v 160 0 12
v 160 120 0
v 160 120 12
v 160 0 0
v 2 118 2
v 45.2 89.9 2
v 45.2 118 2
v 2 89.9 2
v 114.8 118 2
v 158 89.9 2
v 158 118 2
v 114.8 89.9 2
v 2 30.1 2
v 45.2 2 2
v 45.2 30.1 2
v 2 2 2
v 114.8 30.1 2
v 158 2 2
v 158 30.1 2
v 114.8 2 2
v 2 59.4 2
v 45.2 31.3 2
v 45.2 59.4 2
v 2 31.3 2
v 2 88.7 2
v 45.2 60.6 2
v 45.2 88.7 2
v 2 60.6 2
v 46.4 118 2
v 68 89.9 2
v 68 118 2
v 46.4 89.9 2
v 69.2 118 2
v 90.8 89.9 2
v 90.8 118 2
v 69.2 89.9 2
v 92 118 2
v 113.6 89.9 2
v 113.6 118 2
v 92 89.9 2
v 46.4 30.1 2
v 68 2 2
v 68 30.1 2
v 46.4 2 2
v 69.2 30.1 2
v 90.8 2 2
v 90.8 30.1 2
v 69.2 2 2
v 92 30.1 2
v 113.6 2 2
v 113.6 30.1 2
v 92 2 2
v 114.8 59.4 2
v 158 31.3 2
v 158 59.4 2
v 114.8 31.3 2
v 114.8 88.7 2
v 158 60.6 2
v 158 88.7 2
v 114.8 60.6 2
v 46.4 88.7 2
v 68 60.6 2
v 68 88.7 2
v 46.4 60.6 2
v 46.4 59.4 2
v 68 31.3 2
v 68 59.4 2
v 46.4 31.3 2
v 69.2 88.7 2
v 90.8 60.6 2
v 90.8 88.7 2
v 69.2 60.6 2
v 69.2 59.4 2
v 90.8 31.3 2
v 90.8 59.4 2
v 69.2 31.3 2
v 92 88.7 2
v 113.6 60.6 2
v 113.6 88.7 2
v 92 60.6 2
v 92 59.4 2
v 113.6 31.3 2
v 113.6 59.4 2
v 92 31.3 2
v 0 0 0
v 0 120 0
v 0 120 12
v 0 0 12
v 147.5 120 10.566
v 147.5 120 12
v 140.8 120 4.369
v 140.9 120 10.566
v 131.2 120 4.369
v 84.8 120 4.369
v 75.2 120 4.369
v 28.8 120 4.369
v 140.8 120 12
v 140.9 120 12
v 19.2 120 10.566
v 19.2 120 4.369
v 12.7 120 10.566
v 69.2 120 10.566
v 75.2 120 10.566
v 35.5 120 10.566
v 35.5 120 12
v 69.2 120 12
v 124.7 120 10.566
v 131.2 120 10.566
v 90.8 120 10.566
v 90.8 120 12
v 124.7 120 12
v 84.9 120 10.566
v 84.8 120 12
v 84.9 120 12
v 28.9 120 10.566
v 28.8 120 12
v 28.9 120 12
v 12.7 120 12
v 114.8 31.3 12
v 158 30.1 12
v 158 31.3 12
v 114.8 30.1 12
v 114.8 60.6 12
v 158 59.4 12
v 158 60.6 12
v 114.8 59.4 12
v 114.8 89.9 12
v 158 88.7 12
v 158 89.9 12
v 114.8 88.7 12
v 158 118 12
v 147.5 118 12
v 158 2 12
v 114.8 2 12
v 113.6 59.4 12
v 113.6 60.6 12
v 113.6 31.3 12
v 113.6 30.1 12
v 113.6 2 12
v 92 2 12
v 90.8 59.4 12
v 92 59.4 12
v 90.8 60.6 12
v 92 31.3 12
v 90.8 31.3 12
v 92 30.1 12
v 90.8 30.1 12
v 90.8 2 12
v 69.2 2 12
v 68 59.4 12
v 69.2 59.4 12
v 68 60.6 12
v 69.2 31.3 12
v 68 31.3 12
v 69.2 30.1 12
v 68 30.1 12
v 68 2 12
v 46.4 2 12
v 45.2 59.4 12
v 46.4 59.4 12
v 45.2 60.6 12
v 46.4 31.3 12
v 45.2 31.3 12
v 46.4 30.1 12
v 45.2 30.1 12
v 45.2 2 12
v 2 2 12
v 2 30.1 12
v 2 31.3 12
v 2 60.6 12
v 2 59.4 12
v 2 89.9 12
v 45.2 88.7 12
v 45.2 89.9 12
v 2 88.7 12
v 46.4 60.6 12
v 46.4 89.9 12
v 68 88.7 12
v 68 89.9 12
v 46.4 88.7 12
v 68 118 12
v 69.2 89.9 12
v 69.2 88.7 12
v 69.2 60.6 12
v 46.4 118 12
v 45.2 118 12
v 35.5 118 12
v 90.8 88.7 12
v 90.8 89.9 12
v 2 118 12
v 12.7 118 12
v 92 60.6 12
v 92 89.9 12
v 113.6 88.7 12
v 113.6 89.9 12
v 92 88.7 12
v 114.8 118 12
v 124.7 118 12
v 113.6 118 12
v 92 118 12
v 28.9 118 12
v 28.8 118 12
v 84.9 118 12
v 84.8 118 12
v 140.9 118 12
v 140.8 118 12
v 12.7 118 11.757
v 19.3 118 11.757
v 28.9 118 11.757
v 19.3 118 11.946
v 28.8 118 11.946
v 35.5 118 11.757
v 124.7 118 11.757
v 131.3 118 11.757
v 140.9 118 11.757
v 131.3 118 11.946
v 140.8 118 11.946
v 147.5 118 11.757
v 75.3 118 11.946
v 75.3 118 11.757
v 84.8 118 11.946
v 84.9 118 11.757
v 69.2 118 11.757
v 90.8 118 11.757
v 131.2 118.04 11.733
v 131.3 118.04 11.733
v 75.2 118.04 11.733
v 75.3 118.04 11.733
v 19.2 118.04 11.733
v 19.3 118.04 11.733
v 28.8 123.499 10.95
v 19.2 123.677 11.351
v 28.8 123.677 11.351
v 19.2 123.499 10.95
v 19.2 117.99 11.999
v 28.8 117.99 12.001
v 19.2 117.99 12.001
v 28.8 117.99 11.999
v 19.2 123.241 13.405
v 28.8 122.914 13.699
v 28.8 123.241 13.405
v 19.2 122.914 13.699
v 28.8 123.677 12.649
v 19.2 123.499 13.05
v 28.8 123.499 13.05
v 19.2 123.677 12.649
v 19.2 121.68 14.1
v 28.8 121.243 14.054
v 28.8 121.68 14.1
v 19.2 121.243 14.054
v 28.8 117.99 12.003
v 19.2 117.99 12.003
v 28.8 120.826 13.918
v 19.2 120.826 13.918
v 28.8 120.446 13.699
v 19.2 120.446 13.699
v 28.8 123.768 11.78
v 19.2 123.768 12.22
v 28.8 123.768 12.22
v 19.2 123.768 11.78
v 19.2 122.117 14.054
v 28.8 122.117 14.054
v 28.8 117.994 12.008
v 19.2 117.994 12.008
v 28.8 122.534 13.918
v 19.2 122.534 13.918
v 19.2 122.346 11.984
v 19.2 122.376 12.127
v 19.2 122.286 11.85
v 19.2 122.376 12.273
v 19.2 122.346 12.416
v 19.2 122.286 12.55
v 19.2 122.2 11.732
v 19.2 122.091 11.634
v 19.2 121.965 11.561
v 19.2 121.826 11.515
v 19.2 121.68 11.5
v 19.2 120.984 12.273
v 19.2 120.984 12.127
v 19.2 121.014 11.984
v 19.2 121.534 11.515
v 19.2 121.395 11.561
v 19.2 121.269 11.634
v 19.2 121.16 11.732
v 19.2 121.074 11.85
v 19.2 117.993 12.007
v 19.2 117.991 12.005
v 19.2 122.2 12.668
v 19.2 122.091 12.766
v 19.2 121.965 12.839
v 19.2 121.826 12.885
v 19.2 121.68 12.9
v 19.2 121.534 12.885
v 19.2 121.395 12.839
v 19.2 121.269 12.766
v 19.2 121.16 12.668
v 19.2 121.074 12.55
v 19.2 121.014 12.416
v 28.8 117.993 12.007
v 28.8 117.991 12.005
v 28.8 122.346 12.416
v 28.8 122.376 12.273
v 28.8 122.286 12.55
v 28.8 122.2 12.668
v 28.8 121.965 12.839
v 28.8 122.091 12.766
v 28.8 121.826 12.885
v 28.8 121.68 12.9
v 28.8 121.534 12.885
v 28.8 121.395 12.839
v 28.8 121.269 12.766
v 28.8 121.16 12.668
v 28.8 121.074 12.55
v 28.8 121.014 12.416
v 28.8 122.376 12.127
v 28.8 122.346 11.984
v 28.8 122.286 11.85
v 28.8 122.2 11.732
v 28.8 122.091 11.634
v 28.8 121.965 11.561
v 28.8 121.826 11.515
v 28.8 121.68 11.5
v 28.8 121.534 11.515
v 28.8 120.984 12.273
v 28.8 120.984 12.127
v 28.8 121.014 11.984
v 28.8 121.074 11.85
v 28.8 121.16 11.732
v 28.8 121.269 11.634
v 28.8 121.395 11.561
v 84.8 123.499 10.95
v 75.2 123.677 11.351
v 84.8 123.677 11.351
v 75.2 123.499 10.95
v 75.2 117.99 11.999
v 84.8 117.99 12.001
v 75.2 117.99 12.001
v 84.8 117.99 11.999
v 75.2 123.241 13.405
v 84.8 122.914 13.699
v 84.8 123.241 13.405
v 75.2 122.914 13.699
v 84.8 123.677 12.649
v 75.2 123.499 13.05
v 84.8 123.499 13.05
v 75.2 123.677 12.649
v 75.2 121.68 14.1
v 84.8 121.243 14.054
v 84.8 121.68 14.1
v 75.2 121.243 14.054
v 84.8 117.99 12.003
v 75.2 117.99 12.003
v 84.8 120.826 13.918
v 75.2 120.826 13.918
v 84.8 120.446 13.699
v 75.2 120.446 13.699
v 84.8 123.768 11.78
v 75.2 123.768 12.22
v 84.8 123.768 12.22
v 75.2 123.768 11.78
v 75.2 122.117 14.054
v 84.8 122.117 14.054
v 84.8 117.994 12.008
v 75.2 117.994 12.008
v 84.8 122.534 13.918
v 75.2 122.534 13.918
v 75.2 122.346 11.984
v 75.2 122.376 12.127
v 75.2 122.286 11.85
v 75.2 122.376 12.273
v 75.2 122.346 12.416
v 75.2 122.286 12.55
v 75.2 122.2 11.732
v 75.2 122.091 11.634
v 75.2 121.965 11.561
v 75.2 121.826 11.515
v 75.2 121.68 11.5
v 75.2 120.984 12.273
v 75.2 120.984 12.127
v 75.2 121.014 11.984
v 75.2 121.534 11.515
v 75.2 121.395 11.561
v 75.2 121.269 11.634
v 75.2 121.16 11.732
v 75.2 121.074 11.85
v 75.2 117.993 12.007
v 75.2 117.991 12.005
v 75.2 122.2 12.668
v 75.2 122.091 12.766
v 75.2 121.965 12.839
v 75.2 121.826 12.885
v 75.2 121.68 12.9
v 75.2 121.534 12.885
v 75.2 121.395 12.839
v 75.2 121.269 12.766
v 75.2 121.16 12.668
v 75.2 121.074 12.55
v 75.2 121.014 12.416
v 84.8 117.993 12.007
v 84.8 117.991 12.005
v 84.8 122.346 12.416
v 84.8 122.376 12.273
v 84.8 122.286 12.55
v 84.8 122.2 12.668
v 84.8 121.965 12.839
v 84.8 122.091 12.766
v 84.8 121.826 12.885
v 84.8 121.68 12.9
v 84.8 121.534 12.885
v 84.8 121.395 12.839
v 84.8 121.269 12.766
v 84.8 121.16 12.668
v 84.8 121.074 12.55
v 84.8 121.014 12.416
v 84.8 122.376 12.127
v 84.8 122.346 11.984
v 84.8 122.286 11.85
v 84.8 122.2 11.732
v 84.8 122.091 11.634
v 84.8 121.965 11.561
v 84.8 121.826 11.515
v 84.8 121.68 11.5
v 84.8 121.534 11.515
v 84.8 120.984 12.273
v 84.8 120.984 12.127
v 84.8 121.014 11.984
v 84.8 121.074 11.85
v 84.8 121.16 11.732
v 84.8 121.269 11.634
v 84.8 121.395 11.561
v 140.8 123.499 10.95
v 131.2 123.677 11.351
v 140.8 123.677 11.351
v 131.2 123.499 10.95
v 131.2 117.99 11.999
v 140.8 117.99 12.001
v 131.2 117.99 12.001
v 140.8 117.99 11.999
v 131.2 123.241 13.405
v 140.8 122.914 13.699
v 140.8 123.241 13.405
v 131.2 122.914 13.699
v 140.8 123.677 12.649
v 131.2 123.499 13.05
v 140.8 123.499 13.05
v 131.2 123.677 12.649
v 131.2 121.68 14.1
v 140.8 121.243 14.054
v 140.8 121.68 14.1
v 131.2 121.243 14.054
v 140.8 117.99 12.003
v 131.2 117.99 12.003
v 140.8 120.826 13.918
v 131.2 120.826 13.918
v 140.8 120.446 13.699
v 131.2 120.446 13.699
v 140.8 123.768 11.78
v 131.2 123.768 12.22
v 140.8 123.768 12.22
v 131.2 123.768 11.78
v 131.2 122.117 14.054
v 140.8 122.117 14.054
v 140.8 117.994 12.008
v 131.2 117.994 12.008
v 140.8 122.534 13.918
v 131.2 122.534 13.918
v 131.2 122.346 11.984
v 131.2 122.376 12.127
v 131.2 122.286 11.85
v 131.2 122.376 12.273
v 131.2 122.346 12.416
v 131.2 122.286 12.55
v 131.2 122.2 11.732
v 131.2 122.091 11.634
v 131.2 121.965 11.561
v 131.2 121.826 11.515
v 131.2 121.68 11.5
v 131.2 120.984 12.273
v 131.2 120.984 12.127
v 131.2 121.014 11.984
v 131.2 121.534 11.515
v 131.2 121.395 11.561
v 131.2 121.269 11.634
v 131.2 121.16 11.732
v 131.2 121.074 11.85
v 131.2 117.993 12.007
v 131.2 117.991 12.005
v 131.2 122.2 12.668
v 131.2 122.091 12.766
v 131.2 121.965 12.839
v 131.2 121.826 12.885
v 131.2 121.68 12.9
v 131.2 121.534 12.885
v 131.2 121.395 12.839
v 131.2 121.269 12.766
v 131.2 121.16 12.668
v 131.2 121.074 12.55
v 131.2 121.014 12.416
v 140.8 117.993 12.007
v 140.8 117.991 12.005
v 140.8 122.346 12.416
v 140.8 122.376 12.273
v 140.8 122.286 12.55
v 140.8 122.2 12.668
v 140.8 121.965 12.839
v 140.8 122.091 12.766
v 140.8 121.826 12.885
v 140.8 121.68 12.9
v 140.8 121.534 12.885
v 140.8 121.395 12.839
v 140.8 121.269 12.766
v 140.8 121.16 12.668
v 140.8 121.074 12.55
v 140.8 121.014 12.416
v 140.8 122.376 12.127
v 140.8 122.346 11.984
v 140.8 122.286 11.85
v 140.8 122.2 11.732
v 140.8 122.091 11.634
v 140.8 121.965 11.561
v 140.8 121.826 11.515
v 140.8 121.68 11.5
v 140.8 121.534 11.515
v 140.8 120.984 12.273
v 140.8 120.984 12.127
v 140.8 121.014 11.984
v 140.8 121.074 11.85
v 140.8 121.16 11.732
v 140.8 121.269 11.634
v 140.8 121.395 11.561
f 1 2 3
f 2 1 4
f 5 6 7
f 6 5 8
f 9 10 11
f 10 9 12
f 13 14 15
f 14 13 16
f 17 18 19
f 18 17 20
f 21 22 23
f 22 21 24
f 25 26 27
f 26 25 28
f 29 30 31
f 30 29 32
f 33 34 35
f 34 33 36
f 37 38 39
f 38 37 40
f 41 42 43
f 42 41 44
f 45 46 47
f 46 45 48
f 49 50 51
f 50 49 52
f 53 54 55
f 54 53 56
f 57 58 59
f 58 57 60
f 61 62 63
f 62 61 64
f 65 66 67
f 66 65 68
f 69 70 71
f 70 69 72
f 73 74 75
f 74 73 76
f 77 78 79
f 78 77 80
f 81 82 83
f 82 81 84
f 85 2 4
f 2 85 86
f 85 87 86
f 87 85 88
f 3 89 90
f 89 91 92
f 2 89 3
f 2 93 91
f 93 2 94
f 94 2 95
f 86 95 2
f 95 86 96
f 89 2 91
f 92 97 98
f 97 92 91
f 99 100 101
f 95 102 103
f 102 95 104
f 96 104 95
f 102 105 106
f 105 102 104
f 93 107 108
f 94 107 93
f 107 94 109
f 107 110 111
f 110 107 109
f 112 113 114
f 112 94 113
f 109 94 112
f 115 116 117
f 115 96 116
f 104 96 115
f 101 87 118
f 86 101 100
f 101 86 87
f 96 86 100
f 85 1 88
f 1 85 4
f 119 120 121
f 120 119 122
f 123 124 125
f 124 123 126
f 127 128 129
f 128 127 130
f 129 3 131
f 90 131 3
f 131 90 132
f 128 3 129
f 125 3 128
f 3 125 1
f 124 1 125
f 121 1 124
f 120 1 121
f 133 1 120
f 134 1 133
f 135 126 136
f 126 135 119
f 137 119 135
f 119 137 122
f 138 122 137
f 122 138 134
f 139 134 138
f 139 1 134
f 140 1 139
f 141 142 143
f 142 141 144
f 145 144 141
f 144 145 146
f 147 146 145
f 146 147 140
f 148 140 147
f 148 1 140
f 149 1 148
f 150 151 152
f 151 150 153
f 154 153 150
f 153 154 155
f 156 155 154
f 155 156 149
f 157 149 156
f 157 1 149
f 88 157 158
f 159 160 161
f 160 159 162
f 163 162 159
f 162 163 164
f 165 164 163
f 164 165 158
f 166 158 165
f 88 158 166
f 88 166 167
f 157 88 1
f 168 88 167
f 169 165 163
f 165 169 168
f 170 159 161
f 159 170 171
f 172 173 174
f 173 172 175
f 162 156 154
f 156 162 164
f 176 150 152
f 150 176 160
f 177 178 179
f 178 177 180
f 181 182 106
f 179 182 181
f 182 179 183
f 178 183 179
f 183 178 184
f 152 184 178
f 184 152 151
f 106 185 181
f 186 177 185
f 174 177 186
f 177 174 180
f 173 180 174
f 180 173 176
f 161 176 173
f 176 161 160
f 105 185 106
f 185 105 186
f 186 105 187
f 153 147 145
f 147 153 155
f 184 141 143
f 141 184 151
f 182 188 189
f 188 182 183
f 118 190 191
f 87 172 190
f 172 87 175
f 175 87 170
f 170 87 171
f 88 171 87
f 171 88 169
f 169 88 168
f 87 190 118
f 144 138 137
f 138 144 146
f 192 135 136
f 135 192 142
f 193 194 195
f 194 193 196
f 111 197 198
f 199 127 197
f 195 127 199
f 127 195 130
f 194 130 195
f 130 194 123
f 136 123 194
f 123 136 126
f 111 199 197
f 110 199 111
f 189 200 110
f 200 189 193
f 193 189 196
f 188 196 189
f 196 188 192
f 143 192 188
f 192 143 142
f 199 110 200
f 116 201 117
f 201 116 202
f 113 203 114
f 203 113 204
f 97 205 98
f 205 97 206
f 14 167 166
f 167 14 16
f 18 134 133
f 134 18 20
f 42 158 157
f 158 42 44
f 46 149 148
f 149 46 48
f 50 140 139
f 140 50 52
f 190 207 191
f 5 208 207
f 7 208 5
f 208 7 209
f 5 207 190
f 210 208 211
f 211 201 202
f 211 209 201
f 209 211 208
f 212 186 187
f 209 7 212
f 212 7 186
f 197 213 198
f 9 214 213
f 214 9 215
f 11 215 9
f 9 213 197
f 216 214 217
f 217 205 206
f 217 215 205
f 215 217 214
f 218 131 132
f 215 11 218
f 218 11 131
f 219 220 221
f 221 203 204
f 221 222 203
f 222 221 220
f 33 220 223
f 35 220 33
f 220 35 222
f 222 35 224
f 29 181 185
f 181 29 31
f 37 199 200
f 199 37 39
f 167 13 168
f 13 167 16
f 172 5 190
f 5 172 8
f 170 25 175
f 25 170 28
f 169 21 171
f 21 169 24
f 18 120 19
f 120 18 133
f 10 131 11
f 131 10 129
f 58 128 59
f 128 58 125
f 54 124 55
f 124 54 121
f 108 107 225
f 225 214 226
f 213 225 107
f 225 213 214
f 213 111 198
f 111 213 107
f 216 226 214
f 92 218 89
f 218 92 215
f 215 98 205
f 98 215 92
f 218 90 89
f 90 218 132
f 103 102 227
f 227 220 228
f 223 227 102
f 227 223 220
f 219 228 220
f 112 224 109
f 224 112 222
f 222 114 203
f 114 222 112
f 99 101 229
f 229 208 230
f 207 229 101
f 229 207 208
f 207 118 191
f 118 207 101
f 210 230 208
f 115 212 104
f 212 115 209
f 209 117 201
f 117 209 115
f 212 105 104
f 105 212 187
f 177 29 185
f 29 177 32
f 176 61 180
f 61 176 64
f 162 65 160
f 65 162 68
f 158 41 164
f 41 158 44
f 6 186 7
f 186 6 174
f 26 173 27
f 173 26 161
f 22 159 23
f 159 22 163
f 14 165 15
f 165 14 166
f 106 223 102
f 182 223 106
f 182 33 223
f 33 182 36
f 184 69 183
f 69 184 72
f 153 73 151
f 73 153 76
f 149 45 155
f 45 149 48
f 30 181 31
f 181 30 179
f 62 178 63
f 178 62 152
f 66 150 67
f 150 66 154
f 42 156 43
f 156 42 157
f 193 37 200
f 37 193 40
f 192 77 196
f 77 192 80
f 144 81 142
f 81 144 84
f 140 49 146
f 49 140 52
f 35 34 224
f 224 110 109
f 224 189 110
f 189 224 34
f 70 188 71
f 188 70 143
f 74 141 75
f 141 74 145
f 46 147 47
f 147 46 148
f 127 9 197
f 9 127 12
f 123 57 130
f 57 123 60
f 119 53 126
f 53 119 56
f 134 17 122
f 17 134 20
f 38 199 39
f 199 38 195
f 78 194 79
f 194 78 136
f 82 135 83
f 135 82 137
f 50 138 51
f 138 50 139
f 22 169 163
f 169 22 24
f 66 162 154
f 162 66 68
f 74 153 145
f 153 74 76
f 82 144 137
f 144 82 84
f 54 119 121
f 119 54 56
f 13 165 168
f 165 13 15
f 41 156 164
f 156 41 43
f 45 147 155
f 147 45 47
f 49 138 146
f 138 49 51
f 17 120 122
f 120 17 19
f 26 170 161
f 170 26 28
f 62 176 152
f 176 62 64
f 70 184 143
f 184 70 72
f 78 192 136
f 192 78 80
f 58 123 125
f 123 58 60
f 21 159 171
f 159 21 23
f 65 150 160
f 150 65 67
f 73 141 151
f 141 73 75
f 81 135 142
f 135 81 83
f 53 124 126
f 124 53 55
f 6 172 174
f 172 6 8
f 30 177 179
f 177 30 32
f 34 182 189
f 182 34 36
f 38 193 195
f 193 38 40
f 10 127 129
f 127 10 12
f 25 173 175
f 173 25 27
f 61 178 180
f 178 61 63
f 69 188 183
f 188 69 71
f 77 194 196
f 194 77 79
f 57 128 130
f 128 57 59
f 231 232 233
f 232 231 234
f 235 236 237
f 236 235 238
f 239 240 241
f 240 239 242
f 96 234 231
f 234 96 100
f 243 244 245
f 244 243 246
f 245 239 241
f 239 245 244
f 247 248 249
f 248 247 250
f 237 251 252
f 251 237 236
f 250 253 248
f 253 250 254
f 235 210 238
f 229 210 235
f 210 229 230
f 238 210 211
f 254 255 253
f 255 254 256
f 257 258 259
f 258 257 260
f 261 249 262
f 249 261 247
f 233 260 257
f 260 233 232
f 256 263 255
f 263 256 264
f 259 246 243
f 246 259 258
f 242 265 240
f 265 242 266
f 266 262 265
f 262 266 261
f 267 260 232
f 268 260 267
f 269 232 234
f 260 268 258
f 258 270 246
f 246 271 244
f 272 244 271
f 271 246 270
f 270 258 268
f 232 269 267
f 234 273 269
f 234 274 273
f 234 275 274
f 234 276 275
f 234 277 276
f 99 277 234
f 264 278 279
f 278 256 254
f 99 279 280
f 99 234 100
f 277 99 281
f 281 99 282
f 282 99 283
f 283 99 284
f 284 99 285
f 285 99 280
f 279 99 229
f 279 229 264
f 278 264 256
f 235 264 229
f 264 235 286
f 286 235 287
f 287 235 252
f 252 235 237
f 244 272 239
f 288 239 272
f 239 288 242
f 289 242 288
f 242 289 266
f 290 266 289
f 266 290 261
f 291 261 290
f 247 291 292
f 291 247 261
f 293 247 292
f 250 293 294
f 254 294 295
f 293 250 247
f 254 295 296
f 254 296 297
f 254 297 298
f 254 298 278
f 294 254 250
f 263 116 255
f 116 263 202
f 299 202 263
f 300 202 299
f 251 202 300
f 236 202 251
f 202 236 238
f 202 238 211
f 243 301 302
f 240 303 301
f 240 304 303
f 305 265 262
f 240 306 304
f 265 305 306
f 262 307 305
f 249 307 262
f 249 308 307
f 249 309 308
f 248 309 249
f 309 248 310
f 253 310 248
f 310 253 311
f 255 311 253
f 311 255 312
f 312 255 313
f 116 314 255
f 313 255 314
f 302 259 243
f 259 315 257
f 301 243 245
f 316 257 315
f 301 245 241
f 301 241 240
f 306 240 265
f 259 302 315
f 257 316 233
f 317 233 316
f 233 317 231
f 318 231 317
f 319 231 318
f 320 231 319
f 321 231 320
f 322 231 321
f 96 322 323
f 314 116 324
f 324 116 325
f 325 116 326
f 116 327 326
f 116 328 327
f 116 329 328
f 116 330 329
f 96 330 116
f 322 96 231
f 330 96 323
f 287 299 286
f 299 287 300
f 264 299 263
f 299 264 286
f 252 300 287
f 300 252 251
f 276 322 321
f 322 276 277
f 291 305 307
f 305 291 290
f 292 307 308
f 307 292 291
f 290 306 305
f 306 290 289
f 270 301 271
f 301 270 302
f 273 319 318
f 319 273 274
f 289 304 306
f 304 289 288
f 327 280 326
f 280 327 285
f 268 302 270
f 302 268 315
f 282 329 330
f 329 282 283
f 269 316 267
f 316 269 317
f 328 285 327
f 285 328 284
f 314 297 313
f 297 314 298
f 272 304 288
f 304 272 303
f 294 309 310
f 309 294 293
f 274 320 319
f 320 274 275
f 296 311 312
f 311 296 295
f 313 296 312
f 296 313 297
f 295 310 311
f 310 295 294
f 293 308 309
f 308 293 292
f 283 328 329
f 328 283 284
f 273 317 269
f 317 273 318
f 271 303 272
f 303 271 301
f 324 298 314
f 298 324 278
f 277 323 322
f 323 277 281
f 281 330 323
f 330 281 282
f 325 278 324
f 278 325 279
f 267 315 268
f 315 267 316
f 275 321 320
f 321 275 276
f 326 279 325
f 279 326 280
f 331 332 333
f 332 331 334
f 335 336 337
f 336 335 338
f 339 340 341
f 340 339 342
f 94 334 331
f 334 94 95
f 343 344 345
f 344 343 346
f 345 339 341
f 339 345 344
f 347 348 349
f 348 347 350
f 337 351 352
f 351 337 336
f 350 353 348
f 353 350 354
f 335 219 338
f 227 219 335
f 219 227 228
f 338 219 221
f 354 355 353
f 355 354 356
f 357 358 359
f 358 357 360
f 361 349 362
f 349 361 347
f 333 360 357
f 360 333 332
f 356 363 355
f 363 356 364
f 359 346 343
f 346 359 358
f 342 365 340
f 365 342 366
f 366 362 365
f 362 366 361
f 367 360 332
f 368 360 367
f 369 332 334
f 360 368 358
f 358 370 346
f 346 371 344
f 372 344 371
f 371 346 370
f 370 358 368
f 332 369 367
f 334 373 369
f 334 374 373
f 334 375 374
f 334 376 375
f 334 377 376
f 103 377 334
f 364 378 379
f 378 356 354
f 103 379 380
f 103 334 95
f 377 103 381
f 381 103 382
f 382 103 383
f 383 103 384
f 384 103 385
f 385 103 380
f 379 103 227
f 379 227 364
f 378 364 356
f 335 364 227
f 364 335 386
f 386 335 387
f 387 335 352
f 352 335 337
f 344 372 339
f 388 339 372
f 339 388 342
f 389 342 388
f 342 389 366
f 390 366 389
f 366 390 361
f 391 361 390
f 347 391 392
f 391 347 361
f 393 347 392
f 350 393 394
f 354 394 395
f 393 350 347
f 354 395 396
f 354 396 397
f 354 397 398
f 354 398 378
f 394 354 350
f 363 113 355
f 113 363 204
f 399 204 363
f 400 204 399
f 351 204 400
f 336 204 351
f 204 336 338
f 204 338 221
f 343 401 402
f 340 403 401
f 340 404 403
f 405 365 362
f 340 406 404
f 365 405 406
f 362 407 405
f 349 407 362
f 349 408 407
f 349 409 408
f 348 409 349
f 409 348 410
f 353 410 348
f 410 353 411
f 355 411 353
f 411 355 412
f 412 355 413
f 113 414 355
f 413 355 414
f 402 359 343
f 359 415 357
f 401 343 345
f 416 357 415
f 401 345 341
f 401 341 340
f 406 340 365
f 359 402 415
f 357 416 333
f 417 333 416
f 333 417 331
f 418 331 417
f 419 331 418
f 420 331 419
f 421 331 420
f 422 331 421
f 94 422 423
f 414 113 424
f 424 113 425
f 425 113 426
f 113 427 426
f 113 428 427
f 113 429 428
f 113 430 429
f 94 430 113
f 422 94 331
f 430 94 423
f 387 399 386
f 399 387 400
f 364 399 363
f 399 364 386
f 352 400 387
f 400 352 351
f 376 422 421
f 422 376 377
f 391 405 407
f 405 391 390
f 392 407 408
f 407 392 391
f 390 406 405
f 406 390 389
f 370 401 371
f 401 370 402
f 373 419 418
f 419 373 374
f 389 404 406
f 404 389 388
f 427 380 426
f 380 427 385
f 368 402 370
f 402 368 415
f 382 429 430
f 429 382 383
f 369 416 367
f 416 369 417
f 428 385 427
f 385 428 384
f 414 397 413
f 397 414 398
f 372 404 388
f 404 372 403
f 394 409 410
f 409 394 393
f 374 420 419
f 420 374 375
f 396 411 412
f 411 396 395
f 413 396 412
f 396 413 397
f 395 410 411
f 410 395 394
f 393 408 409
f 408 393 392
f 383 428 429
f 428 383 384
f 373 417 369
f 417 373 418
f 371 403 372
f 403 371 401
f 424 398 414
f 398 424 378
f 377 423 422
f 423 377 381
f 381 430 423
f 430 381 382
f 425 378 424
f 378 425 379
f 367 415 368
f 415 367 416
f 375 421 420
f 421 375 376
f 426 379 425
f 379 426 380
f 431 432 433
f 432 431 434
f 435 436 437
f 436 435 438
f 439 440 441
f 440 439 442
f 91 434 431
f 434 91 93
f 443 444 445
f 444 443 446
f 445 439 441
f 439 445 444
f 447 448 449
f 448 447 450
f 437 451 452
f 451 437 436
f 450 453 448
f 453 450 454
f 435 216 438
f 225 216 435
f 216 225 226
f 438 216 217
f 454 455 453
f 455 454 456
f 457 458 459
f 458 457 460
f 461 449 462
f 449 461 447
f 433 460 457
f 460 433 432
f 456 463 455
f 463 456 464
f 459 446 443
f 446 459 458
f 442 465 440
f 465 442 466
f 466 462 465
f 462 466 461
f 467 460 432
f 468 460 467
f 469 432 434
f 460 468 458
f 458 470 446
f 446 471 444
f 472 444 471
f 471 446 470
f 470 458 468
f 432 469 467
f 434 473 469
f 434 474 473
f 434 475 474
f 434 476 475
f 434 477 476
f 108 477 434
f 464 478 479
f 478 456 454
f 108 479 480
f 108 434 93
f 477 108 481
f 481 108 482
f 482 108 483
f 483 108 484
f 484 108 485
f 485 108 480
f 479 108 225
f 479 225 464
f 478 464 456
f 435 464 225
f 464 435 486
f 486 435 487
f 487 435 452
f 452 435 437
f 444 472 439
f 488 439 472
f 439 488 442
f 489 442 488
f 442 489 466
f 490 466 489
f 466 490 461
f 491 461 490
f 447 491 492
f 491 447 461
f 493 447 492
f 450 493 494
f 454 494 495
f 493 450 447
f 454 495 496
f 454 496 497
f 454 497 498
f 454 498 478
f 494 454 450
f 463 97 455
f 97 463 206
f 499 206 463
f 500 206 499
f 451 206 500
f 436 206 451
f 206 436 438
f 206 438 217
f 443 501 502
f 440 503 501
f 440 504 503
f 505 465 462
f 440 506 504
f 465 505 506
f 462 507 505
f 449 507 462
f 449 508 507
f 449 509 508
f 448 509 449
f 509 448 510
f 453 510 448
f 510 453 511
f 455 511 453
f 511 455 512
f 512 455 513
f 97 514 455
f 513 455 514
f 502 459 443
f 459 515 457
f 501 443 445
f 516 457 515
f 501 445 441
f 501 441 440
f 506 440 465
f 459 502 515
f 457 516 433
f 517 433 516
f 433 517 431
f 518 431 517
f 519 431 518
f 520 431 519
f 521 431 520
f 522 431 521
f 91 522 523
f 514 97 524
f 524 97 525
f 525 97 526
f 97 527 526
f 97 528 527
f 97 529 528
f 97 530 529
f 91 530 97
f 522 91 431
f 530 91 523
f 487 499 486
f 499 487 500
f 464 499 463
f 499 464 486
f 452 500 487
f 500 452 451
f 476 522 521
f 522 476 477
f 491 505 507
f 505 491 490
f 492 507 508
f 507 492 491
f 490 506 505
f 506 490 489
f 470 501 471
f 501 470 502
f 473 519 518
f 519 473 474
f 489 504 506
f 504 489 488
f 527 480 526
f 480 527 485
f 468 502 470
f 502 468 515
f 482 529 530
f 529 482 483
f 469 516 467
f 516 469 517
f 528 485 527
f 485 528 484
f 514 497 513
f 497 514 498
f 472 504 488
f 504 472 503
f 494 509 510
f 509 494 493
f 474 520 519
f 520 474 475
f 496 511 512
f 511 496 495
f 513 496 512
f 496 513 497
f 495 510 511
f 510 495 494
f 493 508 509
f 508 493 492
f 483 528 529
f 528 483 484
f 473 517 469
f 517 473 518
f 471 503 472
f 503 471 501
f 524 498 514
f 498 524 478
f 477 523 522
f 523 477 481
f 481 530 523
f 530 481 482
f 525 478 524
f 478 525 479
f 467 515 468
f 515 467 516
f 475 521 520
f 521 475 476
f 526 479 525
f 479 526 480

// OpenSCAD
/*
    3D printable small box with dividers
    Example for a parameterized design
*/

echo("***main start***********************************");

// all measurement are in mm

// outer dimensions
odim_x = 160;  // length - the hinges for the tap are along this edge
odim_y =  120;  // width
body_z =  12;  // height of the body
tap_z  =   8.5; // height of the tap

odim_z =  body_z + tap_z;  // height of the box with tap
owall = 2.0;   // thickness outer walls/top/bottom 
iwall = 1.2;   // thickness inner walls (for the dividers)
top = 1.3;  // thickness of the tap wall

// dividers, n = trays, n-1 = inner walls, [1] or [] means: no dividers
div_x = [6,3,3,3,6];  // relative size of frays 
div_y = [1,1,1,1];
div_height = body_z;


   body();
// tap(); 
// show();

echo("***main end************************************");

gap = 0.01;
// calculated values
// the derived values are checked here

function vecsum(li, c=0)  =  c < len(li)-1 ?  li[c] + vecsum(li, c+1)  : li[c];
function sumv(v,i,s=0) = (i==s ? v[i] : v[i] + sumv(v,i-1,s));

// how many hinges generated for side length x
function hinge_count(x) = x < 60 ? 1 : x < 150 ? 2 : 3;
// two hinge sizes: 1: two smaller for the tap, 2: one larger for the body
function hinge_size(x, n) = [max(4, x/n * 0.12), max(6, x/n * 0.18)];

//s = 149; echo("hinge_count", hinge_count(s), "size", hinge_size(s,hinge_count(s)));


module show() {
    body();
    move_on_top(odim_z, tap_z) {
        color("blue") {
            tap();
        }
    }
}

module body() {
    difference() {
        body_outer();
        move_on_top(body_z, tap_z) 
            tap_hinges(addmarg=0.2);
    }
    body_dividers();
    color("red") body_hinges();

}

module tap() {
    difference() {
        open_box(x=odim_x, y=odim_y, z=tap_z, wall=owall, base=top);
        move_on_top(tap_z, body_z)
            body_hinges(addmarg=0.2);
    }
    color("blue") tap_hinges();
}


module move_on_top(bot_z, top_z) {
    translate([odim_x, 0, body_z+tap_z])
    rotate([0,180,0])
        children();
}

module body_hinges(addmarg=0) {
    n = hinge_count(odim_x);
    offs = [[0.5],[0.20, 0.80], [0.15, 0.5, 0.85]];
    for (x = offs[n-1]) {
        translate([odim_x * x, odim_y, body_z]) lo_hinge(addmarg);
    }    
}
module tap_hinges(addmarg=0) {
    n = hinge_count(odim_x);
    offs = [[0.5],[0.20, 0.80], [0.15, 0.5, 0.85]];
    for (x = offs[n-1]) {
        translate([odim_x * x, odim_y, tap_z]) 
            hi_hinge(addmarg);
    }    
}

module hi_hinge(addmarg) {
    s12 = hinge_size(odim_x,hinge_count(odim_x));
    lo = s12[1]; // size (length) of larger hinge tube
    hi = s12[0];
    offs = lo/2+hi/2 + 0.1;
    translate([ offs ,0,0])   hinge(hi, addmarg);
    translate([-offs ,0,0])   hinge(hi, addmarg);
}

module lo_hinge(addmarg) {
    s12 = hinge_size(odim_x,hinge_count(odim_x));
    lo = s12[1]; // size (length) of larger hinge tube
    hinge(lo, addmarg);
}

module hinge(hsize, addmarg) {
    // the orientation is for the edge of the wall
    // additional margin for subtracting from opposite wall
    $fn=30;
    
    // outer shape
    hole_r = 0.70; // enough for a pin
    // the tube is attached by a hull 
    tube_r = 2.1;   // stable enough? not too clumsy?
    // the center of the hole is a little bit outside the body wall
    wdist = tube_r * 0.8; 
    
    rotate([0,-90,0])      // rotate horzontal for the xz-wall
    translate([0, wdist, -hsize/2]) // sink in to the center
    difference() {
        hull() {
            cylinder(r=tube_r, h=hsize+addmarg);
            translate([0, -wdist-owall, 0]) cylinder(r=0.01+addmarg, h=hsize+addmarg);
            translate([-4*tube_r, -0.1-owall, 0]) cylinder(r=0.01, h=hsize);
        }
        // a little x-offset gives space to close the tap
        translate([0.2, 0, -gap]) cylinder(r=hole_r, h=hsize+2*gap);
    }
}


module body_outer() {
    open_box(x=odim_x, y=odim_y, z=body_z, wall=owall, base=owall);
}

module open_box(x, y, z, wall, base) {
    color("green") cube([x, y, base]); // floor
    cube([x, wall, z]);  // xz-wall 
    translate([0, y-wall, 0])
        cube([x, wall, z]);  // far xz-wall
    cube([wall, y, z]);  // yz-wall
    translate([x-wall, 0, 0])
        cube([wall, y, z]);  // far yz-wall
}
module body_dividers() {
    function accum(v) = len(v) > 1 ? [for (ndx=[0:len(v)-2]) [ndx, sumv(v,ndx)]] : [];
    function div_fact(vect, total, wall) = (total - wall *(len(vect)-1)) / vecsum(vect);
    for (div = accum(div_x)) {
        fact = div_fact(div_x, odim_x - 2*owall, iwall);
        offs = owall + div[0]*iwall + div[1]*fact;
        translate([offs,0,0]) cube([iwall, odim_y, div_height]);
    }
    for (div = accum(div_y)) {
        fact = div_fact(div_y, odim_y - 2*owall, iwall);
        offs = owall + div[0]*iwall + div[1]*fact;
        translate([0, offs, 0]) cube([odim_x, iwall, div_height]);
    }
}
